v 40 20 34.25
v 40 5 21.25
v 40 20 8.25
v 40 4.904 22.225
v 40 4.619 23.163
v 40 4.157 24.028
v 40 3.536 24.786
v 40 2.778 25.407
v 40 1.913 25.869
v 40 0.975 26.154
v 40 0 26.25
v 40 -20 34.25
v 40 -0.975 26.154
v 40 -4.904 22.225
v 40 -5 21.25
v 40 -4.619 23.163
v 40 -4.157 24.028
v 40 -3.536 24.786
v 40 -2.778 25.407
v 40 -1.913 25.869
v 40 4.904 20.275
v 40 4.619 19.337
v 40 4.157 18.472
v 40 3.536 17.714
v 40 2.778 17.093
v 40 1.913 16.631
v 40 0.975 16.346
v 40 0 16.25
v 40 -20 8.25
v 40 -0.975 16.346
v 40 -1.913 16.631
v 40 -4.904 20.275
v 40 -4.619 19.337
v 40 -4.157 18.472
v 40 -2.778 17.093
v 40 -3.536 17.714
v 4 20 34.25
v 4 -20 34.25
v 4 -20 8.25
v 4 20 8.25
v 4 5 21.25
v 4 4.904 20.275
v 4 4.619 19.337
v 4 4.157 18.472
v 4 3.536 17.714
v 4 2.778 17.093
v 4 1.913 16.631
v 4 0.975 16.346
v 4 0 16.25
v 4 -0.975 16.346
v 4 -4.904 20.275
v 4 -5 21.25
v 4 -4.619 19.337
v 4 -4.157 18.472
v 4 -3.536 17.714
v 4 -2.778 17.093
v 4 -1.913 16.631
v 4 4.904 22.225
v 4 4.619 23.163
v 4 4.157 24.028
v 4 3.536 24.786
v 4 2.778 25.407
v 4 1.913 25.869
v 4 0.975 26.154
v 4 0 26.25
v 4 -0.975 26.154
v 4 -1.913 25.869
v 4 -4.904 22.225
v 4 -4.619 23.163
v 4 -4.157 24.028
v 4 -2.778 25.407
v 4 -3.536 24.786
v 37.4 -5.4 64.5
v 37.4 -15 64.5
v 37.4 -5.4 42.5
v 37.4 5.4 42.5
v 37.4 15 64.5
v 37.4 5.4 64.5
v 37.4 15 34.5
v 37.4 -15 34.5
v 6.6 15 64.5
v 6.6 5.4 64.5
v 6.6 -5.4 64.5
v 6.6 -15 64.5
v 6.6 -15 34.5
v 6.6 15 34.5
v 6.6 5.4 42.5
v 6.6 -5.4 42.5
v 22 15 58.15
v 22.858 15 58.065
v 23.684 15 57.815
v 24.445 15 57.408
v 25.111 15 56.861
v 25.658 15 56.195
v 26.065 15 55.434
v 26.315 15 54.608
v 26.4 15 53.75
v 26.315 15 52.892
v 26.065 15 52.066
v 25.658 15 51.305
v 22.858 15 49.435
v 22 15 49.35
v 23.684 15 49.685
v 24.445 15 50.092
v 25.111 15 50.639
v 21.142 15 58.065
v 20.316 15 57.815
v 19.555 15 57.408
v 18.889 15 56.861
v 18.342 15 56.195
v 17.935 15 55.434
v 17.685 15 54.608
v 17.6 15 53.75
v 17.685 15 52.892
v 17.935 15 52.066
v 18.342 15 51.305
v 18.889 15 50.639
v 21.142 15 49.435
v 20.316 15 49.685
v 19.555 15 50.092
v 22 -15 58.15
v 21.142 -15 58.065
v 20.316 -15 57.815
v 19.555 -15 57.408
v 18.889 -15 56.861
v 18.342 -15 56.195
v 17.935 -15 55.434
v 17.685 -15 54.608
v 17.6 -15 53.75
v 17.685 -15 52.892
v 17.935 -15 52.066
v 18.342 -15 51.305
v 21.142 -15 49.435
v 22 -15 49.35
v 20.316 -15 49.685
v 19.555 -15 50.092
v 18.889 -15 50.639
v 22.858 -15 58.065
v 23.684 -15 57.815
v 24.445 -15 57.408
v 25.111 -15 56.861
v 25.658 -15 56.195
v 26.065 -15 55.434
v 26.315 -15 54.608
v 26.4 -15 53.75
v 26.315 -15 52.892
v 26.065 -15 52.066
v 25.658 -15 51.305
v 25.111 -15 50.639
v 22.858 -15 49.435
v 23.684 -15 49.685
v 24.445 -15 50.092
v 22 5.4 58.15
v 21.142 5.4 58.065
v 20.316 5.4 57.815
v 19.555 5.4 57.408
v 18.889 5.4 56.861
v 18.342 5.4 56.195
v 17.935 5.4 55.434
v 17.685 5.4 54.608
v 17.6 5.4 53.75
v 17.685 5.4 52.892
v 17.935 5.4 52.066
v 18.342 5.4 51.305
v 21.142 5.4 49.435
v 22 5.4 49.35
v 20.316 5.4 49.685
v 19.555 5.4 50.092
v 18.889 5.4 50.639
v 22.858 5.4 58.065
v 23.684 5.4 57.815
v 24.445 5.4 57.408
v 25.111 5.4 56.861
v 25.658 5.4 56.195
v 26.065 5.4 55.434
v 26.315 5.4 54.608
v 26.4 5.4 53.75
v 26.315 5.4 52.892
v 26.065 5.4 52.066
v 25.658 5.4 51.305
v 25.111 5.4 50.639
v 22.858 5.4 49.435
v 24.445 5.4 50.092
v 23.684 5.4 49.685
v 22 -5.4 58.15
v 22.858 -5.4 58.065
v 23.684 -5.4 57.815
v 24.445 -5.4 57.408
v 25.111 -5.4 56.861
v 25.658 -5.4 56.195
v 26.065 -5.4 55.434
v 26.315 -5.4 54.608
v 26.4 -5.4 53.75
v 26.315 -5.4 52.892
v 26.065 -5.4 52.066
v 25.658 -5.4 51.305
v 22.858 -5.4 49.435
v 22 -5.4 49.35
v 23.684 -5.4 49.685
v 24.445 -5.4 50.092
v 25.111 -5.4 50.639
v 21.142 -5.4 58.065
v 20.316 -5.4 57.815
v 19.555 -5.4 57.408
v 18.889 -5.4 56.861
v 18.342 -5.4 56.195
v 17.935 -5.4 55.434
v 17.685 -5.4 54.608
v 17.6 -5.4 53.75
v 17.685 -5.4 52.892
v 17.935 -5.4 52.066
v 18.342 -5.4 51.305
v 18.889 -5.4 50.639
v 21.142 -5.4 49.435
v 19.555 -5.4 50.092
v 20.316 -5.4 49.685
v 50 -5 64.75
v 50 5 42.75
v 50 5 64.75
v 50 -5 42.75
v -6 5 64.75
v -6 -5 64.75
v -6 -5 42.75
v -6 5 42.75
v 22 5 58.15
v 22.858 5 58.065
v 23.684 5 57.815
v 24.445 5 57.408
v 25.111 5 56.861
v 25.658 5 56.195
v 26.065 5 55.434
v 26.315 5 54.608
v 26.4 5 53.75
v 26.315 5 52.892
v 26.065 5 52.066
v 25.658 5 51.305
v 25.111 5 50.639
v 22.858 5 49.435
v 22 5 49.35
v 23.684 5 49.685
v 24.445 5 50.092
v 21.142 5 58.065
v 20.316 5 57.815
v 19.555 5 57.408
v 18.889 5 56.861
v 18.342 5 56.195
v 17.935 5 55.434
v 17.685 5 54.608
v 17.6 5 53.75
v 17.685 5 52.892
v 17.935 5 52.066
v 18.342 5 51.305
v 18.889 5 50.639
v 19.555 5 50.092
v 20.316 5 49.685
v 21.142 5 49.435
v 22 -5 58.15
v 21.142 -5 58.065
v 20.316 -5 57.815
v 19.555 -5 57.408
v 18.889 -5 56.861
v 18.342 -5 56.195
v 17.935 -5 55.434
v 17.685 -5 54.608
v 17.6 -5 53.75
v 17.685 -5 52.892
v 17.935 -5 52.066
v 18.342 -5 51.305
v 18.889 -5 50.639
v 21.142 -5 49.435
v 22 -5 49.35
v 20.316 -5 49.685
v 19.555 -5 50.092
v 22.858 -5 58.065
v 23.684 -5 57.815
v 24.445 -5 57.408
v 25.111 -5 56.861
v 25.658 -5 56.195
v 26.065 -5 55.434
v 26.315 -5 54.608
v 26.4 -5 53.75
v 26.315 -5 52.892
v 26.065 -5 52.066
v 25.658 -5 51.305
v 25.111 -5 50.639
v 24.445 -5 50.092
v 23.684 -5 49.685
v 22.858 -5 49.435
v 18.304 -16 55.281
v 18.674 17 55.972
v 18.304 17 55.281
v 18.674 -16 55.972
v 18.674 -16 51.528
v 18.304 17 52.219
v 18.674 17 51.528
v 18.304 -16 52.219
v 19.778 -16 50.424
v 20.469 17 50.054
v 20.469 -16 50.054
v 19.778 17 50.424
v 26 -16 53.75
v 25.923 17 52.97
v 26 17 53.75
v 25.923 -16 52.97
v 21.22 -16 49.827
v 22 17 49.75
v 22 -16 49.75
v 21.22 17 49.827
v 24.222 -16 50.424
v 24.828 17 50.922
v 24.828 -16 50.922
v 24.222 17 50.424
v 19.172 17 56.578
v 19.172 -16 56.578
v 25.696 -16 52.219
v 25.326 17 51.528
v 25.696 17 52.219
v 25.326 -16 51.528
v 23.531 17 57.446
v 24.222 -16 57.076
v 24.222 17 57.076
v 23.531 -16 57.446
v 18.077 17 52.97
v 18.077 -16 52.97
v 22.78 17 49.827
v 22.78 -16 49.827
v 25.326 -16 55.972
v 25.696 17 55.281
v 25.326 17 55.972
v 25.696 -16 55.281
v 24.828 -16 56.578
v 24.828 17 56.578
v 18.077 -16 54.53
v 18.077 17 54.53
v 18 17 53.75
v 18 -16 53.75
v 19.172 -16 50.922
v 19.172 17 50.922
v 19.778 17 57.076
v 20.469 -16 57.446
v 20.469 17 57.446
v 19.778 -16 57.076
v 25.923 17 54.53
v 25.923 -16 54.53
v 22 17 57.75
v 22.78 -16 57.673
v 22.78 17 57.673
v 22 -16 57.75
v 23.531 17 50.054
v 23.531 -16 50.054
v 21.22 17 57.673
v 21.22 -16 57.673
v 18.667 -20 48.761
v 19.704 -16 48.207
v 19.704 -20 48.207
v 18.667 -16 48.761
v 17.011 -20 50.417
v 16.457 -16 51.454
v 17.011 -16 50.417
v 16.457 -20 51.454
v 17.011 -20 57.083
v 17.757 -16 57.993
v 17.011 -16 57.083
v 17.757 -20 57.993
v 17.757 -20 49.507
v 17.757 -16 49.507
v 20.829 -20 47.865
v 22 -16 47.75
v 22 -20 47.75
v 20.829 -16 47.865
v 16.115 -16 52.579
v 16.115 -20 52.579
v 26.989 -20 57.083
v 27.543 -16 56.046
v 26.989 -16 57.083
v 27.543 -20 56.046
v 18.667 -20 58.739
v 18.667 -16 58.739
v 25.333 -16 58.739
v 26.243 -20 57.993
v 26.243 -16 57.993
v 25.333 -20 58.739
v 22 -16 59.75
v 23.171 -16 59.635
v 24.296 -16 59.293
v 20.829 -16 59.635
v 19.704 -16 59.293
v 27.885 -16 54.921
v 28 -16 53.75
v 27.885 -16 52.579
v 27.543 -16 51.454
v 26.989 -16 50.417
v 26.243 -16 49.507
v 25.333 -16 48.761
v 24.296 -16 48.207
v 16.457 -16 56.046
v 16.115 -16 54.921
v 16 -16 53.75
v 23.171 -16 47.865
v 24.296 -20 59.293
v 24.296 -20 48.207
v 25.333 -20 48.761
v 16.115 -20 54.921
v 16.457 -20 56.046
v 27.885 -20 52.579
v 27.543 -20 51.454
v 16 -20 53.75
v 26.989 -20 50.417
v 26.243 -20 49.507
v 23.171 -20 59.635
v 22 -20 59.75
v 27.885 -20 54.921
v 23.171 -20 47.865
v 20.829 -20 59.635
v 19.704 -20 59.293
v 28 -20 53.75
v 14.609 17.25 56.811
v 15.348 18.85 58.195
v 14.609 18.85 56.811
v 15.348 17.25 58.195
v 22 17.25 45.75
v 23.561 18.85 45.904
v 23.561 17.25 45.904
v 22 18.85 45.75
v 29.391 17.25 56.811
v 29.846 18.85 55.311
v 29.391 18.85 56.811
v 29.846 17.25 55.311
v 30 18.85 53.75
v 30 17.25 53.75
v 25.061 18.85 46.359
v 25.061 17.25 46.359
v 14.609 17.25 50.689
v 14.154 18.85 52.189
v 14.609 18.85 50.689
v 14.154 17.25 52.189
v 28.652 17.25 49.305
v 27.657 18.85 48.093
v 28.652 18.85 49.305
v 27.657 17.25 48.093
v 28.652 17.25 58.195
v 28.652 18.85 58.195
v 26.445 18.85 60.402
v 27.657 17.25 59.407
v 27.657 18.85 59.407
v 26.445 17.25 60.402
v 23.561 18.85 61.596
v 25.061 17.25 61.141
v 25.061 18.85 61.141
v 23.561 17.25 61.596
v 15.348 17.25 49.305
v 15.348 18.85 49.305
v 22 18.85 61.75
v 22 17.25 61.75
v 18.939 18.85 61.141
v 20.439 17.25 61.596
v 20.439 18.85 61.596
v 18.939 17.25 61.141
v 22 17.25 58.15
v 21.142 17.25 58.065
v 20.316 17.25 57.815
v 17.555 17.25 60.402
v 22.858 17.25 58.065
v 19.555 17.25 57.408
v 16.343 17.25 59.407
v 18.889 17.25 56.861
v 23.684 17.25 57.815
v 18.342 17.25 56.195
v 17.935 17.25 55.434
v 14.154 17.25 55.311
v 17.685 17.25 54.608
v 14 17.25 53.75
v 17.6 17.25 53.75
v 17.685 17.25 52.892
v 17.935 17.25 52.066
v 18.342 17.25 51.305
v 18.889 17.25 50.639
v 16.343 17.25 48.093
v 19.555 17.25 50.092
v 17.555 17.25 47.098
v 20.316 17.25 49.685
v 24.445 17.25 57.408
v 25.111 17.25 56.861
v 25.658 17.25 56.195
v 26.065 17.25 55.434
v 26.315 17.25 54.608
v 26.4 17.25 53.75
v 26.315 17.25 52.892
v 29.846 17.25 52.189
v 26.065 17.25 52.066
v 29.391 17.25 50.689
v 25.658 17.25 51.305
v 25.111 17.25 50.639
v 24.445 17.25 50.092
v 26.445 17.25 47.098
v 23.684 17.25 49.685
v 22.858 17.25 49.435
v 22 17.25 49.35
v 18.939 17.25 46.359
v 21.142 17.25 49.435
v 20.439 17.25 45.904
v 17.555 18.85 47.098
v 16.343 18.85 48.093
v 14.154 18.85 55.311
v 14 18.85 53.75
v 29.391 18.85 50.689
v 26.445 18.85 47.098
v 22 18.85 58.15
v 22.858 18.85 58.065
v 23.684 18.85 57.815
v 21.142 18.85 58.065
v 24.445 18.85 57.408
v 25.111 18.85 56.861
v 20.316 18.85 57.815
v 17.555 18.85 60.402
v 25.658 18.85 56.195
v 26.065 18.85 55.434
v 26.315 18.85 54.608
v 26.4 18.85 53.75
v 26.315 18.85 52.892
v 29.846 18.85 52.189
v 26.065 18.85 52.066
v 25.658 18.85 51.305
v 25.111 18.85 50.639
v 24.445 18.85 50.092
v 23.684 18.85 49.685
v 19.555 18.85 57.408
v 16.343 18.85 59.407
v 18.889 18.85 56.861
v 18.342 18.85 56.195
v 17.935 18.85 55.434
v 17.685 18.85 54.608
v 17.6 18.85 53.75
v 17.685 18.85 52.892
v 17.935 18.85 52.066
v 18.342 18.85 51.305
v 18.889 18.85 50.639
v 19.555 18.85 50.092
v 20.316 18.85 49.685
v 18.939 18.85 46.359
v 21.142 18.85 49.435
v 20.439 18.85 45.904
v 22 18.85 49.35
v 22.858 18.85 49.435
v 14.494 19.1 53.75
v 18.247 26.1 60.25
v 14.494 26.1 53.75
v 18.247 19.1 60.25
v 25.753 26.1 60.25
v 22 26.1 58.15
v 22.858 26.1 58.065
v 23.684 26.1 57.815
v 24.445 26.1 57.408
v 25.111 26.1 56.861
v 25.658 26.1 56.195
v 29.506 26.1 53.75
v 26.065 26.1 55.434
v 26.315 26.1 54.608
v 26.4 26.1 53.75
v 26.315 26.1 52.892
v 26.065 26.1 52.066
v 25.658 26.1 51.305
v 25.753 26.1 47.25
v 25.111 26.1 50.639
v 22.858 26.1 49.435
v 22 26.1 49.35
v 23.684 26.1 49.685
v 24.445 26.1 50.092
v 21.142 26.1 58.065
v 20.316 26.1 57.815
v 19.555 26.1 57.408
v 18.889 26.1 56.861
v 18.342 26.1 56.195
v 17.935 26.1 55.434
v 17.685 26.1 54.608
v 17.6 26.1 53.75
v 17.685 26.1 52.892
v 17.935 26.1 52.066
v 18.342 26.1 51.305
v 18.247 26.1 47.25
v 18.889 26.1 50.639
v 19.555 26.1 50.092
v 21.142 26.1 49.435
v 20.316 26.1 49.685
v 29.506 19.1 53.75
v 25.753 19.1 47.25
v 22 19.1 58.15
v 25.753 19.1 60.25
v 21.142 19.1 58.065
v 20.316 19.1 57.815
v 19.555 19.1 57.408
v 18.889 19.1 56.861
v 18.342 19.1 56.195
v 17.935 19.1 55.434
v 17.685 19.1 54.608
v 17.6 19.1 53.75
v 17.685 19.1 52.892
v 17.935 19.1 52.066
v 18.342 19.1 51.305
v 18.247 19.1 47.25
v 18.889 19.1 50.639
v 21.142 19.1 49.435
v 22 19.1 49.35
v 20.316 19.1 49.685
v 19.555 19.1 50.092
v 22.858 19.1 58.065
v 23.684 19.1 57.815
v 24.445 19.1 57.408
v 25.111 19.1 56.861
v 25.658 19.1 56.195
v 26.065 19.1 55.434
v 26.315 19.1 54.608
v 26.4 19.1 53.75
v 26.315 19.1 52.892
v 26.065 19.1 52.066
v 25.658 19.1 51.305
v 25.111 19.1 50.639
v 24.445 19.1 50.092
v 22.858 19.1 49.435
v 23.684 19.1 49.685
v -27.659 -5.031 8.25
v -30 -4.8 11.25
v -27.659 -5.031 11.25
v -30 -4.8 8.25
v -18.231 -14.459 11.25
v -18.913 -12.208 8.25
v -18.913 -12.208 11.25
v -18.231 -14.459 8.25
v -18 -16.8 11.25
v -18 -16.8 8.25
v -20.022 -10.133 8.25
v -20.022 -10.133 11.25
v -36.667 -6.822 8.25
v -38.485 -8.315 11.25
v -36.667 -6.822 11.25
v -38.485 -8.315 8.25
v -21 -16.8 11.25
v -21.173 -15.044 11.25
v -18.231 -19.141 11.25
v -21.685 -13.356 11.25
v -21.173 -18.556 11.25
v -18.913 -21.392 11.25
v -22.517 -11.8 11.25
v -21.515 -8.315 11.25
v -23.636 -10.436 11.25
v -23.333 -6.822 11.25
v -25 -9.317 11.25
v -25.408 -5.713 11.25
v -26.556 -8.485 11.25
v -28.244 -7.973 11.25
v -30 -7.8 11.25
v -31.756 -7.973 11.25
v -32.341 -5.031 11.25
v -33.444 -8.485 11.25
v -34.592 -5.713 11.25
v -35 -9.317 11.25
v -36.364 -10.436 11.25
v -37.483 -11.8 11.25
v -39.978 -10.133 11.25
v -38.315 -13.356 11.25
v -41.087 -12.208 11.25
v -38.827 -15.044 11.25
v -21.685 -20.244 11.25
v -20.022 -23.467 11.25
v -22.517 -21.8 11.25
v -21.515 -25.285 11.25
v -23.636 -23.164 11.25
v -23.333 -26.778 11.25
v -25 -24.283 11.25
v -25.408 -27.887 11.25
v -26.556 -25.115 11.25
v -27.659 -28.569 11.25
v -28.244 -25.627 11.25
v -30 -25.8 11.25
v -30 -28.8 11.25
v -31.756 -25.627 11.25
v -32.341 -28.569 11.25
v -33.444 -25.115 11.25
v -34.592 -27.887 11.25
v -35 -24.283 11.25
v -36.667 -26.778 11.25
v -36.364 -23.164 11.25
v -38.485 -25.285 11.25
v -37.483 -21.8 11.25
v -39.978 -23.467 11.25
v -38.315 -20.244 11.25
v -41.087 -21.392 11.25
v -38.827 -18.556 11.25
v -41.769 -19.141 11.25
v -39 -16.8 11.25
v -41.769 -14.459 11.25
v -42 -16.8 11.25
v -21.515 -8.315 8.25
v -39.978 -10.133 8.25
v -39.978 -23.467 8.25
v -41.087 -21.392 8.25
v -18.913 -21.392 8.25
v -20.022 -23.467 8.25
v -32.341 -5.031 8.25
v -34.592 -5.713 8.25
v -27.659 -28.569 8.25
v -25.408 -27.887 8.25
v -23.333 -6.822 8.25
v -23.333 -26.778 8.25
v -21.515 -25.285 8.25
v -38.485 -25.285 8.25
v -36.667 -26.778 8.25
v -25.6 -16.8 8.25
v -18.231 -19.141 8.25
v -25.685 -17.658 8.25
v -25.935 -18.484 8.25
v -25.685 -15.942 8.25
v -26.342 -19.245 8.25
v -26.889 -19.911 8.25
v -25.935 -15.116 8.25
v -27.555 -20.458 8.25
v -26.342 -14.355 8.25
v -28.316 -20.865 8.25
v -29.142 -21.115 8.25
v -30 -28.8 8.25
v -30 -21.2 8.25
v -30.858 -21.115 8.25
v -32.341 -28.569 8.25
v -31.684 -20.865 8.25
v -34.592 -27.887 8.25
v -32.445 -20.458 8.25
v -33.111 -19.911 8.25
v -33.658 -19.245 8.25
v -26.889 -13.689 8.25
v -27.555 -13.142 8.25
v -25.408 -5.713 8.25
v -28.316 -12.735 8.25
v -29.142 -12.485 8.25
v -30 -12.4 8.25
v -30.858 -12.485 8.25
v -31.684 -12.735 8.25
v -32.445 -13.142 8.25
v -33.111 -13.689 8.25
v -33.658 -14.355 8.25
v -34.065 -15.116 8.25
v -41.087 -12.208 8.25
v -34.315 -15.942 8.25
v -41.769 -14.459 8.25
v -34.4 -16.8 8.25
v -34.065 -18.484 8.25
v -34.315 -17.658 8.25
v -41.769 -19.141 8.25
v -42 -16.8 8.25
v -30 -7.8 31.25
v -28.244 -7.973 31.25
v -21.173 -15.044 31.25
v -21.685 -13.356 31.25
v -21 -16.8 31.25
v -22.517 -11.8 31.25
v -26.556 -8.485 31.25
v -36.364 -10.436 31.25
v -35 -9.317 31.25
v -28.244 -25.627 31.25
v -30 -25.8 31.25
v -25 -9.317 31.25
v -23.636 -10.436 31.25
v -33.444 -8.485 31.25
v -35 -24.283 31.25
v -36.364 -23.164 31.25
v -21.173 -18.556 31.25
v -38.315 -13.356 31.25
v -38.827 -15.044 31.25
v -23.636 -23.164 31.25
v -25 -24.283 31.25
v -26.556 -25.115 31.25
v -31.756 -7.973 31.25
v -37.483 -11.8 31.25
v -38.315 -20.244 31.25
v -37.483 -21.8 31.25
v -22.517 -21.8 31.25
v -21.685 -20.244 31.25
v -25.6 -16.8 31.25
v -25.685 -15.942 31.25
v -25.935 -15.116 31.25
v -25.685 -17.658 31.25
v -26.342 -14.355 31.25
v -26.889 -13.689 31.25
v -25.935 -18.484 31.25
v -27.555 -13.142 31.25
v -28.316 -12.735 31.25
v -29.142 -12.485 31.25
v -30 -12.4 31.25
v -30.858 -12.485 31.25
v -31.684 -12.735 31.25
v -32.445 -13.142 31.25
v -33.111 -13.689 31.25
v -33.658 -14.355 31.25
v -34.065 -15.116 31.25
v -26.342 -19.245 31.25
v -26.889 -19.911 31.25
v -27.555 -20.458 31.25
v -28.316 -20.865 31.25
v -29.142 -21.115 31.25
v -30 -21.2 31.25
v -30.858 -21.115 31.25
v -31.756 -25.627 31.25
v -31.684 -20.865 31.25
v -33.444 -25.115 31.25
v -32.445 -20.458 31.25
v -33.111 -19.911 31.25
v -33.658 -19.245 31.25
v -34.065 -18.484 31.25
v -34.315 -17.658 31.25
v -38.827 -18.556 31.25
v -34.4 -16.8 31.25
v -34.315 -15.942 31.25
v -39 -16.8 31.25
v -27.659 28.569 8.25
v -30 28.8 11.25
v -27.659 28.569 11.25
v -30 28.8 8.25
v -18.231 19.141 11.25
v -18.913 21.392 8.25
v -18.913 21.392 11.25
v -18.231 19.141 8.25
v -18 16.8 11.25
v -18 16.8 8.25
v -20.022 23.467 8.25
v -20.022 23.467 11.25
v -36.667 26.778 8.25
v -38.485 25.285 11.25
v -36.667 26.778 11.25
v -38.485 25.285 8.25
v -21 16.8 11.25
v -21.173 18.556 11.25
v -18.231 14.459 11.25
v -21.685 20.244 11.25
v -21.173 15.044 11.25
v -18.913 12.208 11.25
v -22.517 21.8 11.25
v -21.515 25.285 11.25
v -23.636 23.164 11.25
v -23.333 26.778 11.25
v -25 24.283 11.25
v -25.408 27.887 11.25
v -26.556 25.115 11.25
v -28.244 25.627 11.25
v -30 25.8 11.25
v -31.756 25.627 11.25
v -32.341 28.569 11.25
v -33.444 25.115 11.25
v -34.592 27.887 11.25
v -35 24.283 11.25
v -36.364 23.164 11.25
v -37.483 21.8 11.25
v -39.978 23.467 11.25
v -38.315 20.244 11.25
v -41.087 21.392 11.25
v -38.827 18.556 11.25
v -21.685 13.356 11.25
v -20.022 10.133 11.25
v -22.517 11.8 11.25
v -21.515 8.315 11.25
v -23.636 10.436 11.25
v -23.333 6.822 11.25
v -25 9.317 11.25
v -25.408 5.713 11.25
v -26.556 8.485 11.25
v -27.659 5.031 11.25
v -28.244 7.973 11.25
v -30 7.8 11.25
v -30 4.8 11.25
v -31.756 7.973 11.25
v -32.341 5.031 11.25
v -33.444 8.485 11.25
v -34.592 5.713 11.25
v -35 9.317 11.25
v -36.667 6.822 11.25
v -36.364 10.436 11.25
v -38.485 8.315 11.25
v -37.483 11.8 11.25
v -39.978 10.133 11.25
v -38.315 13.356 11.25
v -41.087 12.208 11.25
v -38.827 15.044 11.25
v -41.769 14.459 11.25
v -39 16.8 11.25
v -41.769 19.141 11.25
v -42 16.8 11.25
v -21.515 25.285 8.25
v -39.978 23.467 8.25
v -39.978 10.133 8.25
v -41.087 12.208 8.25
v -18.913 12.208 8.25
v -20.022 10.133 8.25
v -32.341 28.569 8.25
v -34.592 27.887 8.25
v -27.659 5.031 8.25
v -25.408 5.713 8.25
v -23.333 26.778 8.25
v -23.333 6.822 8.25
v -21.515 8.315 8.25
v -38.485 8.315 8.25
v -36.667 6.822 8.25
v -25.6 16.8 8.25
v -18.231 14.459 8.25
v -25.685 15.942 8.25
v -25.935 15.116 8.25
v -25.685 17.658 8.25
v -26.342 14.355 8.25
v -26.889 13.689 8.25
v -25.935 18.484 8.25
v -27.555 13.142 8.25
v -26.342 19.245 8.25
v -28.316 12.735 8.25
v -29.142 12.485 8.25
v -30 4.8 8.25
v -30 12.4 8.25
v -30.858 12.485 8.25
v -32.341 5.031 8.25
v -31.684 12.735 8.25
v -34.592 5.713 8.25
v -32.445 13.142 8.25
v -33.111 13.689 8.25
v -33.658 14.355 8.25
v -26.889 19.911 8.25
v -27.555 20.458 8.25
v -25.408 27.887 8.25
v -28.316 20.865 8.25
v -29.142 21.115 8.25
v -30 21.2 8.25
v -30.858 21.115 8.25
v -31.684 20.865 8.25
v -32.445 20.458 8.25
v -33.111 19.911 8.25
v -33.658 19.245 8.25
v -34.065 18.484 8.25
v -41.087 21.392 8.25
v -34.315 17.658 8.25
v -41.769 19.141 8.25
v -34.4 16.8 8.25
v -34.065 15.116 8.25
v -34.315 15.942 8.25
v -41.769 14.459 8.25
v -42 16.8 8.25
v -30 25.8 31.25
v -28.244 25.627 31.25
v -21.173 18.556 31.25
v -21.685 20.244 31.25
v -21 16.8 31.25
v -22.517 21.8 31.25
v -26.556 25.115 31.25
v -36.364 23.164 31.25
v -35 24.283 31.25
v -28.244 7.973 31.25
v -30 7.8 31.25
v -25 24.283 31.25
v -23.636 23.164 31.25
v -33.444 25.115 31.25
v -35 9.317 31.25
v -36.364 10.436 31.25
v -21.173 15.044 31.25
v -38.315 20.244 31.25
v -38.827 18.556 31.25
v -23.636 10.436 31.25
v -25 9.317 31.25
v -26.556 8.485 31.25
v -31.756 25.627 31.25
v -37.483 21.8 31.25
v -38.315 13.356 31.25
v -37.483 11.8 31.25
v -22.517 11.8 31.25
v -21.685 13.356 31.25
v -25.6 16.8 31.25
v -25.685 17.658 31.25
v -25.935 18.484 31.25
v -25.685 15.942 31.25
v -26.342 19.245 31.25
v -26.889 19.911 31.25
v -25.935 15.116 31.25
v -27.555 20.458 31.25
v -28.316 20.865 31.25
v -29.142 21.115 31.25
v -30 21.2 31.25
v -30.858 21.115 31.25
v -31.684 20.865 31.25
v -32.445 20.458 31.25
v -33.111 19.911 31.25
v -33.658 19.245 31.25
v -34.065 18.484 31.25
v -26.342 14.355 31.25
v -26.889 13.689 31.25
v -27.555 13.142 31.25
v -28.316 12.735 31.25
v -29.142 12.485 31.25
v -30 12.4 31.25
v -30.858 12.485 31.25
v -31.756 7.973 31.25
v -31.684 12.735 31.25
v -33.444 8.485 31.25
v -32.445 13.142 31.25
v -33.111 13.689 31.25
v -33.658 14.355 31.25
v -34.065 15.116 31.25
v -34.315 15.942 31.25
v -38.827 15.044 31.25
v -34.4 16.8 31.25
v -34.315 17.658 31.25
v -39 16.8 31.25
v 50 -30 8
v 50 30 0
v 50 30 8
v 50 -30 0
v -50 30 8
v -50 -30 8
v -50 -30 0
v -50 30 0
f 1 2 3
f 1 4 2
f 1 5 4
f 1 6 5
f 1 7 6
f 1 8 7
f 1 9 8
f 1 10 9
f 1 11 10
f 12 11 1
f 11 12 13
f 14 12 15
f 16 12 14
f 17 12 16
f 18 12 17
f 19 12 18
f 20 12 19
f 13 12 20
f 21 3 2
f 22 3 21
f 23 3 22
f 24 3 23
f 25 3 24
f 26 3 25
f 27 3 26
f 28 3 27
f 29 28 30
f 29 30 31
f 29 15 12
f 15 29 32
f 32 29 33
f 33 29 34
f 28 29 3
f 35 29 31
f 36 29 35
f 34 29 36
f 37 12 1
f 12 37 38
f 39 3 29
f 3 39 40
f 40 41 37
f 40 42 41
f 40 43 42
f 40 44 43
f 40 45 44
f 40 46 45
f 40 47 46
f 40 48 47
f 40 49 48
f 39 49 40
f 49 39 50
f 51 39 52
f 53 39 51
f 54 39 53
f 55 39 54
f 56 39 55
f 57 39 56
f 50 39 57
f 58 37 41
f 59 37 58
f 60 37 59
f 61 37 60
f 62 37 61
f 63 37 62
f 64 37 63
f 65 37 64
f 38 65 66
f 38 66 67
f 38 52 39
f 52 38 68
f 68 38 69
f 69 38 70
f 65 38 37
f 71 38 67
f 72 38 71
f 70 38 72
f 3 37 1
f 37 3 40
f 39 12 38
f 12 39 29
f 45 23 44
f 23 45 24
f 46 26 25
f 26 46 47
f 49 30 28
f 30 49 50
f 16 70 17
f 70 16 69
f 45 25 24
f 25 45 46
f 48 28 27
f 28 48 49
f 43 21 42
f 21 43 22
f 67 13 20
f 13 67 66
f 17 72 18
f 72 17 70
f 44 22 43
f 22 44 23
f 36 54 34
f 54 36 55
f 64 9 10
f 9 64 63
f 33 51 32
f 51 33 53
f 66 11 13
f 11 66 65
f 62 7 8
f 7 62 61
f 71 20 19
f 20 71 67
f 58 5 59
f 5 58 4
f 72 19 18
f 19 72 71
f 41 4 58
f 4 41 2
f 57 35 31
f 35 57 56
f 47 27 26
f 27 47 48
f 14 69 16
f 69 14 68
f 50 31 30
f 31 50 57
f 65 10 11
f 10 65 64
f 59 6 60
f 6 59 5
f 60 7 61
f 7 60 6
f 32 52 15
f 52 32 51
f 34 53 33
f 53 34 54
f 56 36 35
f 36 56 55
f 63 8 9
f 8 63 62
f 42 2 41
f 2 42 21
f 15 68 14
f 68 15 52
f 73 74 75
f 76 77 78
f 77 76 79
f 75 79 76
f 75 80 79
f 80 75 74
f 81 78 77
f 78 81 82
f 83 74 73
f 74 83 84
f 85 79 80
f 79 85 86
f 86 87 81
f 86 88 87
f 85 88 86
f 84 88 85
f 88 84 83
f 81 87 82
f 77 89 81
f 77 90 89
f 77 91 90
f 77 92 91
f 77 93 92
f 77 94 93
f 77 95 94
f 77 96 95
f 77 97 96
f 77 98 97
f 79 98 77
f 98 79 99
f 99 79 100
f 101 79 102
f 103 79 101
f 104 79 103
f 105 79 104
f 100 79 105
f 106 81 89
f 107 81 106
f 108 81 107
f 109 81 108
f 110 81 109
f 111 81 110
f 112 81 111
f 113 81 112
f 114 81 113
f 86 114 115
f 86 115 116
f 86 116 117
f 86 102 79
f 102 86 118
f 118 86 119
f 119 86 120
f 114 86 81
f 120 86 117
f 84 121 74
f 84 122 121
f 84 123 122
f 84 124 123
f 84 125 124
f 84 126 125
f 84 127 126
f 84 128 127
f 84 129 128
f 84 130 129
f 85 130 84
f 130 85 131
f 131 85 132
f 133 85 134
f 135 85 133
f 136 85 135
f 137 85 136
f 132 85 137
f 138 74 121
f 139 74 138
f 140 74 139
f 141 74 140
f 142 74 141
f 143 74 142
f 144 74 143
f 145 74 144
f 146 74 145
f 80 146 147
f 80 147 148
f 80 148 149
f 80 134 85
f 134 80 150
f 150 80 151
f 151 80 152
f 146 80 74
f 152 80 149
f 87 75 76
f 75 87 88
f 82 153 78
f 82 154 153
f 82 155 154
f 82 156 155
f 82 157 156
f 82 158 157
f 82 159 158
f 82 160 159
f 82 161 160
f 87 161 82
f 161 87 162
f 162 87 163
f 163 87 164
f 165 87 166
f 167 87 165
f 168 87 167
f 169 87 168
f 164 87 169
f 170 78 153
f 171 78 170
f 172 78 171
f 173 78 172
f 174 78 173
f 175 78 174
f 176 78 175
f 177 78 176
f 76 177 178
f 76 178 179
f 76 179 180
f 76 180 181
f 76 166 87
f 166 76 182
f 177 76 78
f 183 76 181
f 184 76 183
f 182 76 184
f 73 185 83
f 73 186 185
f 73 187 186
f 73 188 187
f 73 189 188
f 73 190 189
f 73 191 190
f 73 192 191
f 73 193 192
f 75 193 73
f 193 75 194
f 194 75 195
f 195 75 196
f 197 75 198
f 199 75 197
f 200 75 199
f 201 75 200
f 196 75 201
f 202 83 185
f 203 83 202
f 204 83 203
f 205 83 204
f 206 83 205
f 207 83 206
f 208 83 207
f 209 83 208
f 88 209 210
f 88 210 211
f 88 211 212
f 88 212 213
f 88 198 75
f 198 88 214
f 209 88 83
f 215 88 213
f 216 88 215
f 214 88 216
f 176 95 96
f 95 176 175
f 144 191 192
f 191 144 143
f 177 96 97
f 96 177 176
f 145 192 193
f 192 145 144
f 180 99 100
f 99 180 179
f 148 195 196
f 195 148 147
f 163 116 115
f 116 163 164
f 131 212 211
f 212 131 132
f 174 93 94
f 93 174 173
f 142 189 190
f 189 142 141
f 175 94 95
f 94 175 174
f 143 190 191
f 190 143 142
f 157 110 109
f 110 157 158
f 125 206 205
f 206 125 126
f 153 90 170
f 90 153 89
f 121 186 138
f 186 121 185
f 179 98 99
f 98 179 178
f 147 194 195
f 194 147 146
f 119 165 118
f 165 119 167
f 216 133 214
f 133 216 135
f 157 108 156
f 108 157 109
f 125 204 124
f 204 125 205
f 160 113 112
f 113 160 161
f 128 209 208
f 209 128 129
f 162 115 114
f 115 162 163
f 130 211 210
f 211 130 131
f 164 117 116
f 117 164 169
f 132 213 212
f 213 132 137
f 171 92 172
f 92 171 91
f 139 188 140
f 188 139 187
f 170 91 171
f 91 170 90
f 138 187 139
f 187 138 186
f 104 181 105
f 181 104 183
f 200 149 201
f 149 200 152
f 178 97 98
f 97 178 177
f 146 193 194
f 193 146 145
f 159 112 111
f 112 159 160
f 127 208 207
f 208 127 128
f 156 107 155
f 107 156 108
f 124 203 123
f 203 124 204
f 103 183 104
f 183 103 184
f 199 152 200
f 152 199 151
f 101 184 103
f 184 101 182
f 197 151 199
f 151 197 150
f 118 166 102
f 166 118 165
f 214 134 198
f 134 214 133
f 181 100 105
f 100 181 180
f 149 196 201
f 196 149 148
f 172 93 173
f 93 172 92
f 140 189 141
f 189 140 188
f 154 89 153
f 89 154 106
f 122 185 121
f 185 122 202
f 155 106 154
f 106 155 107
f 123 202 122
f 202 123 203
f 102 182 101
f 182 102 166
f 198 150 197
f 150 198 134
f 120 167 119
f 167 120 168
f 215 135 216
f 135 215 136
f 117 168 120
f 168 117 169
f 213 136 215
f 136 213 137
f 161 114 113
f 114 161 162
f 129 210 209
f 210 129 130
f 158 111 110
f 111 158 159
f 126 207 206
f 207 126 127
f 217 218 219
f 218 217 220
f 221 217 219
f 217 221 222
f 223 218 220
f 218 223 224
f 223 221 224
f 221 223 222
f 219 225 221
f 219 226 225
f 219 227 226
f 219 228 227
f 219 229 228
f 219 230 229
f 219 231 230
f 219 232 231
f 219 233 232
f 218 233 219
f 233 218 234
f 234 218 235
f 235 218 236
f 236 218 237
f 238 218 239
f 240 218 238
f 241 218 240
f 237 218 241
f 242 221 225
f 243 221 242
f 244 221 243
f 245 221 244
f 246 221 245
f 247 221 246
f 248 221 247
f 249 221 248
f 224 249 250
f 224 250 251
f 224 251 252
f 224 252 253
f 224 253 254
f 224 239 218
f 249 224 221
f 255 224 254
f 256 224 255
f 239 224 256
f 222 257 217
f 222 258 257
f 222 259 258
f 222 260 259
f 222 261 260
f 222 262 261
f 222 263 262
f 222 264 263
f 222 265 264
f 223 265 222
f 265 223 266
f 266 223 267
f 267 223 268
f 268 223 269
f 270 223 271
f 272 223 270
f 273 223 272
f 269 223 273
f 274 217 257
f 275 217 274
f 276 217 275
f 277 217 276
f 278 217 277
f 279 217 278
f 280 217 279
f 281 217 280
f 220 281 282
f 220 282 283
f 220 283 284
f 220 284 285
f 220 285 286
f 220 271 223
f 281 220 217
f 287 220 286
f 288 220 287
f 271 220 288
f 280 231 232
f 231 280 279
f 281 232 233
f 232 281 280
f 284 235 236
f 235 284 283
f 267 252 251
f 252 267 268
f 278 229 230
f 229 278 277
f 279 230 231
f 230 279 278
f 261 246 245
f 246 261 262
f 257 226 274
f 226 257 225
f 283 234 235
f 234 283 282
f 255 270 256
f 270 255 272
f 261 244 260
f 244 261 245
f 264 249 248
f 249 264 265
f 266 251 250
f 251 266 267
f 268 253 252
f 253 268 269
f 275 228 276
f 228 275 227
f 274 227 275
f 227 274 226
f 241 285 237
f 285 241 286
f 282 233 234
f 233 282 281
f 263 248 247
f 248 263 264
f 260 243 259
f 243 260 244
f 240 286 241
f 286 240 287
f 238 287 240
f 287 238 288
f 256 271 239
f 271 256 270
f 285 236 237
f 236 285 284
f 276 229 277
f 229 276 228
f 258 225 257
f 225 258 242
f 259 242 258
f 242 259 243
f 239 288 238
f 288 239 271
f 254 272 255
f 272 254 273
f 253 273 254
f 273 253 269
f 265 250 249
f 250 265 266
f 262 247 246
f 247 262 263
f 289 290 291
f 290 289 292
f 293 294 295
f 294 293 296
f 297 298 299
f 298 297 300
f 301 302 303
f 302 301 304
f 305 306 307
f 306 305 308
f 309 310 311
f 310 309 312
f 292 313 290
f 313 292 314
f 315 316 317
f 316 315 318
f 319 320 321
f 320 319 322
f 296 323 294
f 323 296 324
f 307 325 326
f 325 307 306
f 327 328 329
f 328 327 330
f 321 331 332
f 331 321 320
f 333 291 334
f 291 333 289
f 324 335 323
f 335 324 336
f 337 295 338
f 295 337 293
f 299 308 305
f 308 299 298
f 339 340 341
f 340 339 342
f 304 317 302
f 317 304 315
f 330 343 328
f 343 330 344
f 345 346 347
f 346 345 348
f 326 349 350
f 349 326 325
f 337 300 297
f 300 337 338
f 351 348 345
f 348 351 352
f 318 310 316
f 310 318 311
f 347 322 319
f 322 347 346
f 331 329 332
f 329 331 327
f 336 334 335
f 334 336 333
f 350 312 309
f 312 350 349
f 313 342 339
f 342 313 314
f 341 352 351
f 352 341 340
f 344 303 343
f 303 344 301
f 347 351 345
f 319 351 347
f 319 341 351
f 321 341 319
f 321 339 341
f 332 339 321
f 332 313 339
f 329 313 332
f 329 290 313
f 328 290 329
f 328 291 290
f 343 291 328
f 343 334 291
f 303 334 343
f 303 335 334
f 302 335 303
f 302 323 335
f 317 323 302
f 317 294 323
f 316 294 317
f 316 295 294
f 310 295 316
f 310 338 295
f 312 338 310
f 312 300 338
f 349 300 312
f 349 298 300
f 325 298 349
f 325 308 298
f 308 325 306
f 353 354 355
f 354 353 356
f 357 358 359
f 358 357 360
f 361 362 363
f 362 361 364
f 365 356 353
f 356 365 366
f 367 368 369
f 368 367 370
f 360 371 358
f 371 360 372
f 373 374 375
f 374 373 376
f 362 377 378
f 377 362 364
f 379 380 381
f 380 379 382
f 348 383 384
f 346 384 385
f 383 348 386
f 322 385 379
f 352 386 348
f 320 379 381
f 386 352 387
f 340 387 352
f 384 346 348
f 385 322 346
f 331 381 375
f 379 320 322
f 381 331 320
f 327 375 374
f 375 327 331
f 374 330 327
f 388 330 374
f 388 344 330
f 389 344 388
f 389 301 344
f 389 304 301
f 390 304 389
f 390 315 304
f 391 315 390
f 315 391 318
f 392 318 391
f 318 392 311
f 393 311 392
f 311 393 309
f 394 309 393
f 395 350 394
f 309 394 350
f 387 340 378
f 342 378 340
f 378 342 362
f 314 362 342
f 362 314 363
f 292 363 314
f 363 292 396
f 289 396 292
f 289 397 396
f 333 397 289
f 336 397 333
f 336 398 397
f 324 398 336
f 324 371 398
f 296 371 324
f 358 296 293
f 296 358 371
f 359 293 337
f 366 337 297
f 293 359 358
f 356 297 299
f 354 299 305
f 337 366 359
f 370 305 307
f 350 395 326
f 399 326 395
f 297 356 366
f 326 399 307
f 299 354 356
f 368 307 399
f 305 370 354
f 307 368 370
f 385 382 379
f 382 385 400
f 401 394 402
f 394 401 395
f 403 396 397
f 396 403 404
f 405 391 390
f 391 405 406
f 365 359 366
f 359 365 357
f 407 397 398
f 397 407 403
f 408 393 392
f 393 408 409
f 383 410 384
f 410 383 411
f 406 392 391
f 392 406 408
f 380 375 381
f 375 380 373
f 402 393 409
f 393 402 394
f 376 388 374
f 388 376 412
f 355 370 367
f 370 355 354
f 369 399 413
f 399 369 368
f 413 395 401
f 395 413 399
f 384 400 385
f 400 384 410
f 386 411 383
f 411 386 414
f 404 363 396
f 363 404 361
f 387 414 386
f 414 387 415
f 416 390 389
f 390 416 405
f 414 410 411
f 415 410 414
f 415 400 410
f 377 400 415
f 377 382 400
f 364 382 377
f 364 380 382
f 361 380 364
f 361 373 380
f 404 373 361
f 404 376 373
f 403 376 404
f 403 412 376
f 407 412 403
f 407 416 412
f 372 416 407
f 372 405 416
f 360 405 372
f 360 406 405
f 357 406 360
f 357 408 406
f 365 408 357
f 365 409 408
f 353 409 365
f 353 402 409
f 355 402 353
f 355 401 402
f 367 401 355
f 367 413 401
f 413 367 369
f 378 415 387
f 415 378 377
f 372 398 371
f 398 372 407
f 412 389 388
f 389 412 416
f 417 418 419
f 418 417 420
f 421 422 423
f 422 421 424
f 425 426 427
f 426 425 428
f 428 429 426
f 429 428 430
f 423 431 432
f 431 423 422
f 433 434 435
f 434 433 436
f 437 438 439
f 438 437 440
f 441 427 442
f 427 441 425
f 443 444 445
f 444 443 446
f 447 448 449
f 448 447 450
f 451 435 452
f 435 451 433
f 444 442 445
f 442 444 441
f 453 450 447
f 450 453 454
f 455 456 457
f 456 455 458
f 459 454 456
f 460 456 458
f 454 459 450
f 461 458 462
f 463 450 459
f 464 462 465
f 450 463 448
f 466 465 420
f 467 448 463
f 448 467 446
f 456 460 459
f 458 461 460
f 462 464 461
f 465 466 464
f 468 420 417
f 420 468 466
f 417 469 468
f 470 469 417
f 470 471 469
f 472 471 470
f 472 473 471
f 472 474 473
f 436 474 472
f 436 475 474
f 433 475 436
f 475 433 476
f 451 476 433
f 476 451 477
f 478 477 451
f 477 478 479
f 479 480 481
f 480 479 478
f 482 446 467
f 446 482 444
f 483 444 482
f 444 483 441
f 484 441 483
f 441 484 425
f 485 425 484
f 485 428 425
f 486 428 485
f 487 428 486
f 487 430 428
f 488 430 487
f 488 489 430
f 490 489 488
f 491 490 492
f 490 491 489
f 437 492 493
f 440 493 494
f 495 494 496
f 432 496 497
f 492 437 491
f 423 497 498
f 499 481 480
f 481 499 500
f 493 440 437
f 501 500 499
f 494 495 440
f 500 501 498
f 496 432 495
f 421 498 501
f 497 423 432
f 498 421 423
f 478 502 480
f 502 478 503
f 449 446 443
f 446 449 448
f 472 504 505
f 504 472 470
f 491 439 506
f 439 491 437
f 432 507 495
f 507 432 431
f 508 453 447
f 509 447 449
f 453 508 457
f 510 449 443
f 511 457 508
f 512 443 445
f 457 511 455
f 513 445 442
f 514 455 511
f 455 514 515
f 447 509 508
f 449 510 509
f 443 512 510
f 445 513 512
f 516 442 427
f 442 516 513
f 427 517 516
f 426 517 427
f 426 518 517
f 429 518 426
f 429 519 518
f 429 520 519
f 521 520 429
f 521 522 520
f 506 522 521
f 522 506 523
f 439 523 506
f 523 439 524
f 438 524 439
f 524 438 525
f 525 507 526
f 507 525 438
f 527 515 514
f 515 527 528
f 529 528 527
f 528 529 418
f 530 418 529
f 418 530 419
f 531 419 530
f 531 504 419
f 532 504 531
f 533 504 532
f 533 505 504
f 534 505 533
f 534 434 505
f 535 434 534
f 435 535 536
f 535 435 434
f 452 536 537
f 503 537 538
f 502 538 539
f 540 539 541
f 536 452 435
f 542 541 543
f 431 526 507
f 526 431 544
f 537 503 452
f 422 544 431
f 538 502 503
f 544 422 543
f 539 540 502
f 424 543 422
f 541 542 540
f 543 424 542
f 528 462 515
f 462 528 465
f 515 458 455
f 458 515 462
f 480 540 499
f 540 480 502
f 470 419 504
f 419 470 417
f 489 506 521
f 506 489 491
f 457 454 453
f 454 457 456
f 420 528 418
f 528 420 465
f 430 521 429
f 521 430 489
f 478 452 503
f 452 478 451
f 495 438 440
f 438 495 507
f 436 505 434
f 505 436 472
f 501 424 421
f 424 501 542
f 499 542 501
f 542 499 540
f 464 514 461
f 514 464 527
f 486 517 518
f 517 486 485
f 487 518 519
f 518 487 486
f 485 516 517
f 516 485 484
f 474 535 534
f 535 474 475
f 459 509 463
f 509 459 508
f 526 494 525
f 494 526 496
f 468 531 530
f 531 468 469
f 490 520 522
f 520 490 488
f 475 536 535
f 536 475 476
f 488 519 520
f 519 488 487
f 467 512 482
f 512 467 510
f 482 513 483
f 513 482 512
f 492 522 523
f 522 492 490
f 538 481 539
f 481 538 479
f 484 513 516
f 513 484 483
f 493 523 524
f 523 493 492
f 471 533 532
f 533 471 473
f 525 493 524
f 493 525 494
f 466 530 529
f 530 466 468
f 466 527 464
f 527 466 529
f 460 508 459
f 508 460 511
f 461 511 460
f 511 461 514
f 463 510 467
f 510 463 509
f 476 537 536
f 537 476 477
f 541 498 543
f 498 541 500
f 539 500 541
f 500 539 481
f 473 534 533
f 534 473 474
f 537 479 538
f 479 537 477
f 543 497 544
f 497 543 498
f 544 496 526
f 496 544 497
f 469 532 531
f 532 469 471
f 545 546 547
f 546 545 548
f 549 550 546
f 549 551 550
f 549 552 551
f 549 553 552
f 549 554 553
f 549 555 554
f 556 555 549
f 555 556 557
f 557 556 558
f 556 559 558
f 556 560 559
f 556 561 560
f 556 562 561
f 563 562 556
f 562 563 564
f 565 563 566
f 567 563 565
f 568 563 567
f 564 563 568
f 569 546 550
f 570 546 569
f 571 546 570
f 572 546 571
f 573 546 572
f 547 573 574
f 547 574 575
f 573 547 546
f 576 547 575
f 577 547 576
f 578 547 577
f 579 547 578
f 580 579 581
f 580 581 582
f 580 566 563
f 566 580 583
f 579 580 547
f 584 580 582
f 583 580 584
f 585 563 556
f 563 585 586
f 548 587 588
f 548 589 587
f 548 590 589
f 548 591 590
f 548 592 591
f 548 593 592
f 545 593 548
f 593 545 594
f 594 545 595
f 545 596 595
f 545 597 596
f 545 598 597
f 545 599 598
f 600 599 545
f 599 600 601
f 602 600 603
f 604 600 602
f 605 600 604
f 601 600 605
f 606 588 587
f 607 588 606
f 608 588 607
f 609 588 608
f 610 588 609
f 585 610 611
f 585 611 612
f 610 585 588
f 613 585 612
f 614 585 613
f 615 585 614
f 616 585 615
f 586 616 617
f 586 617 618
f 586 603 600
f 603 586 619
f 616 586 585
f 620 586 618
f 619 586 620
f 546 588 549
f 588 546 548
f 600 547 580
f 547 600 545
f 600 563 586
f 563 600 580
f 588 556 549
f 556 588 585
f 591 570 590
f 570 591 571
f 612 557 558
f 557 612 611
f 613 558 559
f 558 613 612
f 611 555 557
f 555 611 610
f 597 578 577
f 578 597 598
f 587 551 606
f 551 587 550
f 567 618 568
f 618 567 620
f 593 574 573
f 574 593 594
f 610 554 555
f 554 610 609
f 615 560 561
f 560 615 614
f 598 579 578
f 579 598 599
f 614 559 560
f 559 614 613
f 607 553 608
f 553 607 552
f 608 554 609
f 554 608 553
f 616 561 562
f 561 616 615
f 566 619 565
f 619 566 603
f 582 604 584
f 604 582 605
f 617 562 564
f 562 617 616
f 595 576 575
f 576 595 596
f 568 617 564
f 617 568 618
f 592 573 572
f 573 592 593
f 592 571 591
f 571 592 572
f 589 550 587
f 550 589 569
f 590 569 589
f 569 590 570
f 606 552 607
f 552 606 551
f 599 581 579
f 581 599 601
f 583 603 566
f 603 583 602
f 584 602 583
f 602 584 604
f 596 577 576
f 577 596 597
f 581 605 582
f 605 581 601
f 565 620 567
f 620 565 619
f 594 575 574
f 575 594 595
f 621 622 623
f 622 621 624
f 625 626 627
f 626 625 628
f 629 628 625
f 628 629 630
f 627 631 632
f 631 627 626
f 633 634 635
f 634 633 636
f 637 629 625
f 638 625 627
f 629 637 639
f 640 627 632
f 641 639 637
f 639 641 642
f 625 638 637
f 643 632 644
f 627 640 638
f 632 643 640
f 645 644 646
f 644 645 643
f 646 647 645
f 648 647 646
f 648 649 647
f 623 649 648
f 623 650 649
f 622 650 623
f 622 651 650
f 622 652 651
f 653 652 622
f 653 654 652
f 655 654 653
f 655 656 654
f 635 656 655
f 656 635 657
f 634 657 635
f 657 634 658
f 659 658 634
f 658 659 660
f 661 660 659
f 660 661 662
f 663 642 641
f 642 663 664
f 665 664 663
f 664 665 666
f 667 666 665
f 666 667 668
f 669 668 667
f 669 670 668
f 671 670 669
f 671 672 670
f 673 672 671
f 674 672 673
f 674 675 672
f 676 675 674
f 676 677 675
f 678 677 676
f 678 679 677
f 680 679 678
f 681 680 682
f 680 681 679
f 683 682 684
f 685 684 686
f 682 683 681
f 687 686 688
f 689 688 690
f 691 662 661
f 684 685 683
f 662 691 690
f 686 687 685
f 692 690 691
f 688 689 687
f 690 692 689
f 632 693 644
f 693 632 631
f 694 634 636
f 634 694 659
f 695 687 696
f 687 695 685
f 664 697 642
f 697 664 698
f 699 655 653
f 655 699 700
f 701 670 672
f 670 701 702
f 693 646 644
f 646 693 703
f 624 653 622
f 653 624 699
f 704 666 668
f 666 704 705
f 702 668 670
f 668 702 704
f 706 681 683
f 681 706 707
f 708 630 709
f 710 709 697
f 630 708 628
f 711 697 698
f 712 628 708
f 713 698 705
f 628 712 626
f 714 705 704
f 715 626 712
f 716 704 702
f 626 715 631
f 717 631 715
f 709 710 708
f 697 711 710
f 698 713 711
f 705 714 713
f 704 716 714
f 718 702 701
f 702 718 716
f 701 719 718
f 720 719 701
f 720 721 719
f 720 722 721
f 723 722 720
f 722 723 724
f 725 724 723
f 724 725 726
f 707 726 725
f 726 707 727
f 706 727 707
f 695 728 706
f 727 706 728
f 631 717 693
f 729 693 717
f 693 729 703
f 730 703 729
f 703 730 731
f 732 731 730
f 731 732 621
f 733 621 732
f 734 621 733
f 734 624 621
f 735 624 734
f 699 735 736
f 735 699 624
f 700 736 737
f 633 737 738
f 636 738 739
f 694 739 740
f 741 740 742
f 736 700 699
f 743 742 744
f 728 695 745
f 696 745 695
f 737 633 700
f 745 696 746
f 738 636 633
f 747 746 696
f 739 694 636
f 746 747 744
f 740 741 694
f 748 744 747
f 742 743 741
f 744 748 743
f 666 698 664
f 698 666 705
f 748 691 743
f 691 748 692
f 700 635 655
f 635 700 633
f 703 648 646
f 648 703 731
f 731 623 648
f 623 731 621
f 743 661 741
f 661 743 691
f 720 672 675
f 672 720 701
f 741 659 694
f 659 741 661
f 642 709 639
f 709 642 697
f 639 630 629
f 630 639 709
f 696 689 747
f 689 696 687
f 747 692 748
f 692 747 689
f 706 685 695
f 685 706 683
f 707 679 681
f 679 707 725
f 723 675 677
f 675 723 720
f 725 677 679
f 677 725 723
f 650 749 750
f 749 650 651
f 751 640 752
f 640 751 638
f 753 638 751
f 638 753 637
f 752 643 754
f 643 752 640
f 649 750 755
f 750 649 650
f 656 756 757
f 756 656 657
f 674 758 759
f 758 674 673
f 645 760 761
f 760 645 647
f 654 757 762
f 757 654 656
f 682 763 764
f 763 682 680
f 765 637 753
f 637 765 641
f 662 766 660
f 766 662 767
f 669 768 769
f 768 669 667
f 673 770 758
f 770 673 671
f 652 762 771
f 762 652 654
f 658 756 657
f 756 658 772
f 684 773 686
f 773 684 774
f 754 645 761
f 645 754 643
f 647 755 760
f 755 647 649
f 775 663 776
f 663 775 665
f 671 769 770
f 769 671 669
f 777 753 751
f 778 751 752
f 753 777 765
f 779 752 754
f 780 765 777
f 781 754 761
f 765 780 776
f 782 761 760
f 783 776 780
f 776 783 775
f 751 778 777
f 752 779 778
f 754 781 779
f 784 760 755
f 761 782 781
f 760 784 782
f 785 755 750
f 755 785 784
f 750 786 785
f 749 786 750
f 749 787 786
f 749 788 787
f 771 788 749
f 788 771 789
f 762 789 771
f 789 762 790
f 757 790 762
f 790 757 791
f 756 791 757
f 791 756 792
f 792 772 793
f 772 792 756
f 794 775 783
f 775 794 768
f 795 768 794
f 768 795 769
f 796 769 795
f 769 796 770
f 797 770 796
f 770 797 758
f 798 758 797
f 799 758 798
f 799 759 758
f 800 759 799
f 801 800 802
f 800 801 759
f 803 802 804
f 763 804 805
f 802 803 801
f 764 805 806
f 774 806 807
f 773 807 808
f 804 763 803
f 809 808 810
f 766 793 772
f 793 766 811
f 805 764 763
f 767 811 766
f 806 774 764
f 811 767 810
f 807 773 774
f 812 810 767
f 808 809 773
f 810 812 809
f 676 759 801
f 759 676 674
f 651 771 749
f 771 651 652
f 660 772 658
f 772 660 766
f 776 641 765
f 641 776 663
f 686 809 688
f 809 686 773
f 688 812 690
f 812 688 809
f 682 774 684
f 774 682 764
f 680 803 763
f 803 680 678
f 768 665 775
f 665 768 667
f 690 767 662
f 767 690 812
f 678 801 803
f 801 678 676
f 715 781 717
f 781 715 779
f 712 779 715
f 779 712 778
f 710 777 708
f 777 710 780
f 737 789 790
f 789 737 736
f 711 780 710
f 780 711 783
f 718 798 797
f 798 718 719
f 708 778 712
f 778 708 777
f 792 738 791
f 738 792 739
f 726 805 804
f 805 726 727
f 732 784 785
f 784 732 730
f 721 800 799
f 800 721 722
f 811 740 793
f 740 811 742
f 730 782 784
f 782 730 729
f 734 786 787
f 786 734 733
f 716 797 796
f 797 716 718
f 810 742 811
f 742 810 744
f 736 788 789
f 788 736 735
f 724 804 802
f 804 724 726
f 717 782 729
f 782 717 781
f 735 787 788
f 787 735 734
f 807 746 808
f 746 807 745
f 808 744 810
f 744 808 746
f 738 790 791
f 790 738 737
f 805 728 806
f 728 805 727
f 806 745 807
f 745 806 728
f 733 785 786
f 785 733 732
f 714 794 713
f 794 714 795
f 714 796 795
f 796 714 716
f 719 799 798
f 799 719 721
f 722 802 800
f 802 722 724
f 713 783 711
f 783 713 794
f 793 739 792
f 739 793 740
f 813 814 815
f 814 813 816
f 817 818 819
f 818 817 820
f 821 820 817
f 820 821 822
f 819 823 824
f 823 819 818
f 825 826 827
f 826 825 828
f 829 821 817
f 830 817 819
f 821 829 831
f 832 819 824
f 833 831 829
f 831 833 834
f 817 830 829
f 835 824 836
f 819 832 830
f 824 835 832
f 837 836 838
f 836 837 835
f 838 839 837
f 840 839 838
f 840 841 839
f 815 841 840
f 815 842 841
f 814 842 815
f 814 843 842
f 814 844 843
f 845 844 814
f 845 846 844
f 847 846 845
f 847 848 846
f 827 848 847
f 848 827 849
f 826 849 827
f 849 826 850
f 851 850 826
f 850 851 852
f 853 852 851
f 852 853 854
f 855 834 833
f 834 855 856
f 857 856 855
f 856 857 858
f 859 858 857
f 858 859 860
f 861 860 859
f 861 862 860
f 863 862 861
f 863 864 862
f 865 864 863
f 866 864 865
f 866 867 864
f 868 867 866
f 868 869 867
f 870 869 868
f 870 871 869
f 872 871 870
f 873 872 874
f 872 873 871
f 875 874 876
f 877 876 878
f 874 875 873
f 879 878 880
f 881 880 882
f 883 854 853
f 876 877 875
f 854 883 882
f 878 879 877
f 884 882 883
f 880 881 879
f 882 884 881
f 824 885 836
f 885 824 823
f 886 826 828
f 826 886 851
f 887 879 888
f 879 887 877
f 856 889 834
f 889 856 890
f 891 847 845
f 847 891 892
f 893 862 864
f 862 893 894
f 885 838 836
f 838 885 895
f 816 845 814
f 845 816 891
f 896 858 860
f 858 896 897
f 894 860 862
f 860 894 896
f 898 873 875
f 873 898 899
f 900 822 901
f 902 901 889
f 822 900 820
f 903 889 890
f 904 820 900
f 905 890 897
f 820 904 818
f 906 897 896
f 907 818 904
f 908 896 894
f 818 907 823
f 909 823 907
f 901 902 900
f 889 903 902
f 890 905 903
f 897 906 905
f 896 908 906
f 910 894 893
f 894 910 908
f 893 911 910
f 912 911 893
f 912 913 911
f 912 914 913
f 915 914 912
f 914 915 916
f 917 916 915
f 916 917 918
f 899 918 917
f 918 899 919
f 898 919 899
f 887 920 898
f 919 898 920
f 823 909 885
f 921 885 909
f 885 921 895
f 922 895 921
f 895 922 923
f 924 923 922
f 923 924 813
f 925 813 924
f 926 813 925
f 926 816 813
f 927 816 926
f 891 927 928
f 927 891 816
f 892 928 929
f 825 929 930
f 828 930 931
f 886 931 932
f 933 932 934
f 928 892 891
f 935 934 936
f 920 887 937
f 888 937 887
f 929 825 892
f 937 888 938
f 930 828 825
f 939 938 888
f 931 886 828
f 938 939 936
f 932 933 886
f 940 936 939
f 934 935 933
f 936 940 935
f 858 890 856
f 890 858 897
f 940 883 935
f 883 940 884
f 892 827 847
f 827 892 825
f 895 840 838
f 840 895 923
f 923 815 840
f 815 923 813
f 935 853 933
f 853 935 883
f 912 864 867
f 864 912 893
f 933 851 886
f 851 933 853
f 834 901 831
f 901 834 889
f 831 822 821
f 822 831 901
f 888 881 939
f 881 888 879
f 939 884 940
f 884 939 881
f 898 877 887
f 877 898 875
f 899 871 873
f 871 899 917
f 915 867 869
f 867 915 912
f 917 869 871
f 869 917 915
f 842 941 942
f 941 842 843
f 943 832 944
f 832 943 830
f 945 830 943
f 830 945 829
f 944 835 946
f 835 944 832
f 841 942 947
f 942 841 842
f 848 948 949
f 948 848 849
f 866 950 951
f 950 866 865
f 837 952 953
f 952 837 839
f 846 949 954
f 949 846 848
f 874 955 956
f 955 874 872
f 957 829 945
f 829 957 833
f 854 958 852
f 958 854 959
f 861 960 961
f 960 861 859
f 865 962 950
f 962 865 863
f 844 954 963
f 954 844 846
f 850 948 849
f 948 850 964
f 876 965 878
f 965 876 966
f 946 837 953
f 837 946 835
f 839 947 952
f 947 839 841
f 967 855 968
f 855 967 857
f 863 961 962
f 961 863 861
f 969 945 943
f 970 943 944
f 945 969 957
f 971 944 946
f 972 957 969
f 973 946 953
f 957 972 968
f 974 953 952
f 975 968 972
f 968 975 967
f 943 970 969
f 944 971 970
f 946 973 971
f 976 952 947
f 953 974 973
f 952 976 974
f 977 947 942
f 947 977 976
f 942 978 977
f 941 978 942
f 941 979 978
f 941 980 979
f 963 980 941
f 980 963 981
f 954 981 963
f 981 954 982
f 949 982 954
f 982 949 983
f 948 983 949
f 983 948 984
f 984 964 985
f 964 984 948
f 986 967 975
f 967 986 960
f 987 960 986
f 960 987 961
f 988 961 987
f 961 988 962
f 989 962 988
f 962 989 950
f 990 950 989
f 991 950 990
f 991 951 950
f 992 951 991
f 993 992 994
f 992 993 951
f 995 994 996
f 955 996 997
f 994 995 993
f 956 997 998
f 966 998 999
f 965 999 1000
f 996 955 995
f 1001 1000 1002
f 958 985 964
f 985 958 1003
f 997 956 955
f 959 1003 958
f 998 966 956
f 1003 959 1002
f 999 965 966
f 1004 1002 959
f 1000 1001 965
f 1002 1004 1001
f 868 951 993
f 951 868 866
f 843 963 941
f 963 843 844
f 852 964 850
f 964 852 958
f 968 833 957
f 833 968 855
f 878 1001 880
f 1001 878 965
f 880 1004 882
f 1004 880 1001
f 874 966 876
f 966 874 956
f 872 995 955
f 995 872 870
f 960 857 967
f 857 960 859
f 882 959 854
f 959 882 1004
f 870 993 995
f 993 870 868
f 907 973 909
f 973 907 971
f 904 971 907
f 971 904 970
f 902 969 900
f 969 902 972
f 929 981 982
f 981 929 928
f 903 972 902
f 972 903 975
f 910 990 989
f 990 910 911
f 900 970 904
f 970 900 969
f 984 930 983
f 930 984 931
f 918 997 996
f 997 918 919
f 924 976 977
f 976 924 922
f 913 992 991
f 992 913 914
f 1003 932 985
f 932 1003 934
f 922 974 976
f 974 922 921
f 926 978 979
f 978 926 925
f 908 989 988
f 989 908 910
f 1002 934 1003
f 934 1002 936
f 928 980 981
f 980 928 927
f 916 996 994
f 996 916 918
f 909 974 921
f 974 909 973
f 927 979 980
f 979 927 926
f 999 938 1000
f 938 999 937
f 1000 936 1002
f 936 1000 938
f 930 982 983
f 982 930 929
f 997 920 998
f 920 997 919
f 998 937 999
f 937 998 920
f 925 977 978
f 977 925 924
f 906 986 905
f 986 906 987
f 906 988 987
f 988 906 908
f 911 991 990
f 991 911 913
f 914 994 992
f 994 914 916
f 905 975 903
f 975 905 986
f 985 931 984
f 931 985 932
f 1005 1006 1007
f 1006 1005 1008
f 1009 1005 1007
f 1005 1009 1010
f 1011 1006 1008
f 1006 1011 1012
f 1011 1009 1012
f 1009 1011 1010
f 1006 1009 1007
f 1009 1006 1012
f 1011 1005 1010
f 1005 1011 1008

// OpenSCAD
$fn = 32;

// ------------------------------------------------------------------------
// Indexing jig: plate 100 x 60 mm, pin d8
// Every part is its own module, assembly() places every instance.
// ------------------------------------------------------------------------

// --- part 1 ---
module jig_plate() {
  difference() {
    translate([-50, -30, 0]) cube([100, 60, 8]);
  }
}

// --- part 2 ---
module locator_block() {
  difference() {
    translate([-18, -20, 0]) cube([36, 40, 26]);
    translate([0, 0, 13]) rotate([0, 90, 0]) cylinder(h = 38, d = 10, center = true);
  }
}

// --- part 3 ---
module index_fork() {
  difference() {
    translate([-15.4, -15, 0]) cube([30.8, 30, 30]);
    translate([-16.4, -5.4, 8]) cube([32.8, 10.8, 23]);
    translate([0, 0, 19.25]) rotate([90, 0, 0]) cylinder(h = 32, d = 8.8, center = true);
  }
}

// --- part 4 ---
module index_arm() {
  difference() {
    translate([-28, -5, 0]) cube([56, 10, 22]);
    translate([0, 0, 11]) rotate([90, 0, 0]) cylinder(h = 12, d = 8.8, center = true);
  }
}

// --- part 5 ---
module index_pin() {
  rotate([0, 90, 0]) cylinder(h = 34, d = 8, center = true);
  translate([-20, 0, 0]) rotate([0, 90, 0]) cylinder(h = 4, d = 12);
}

// --- part 6 ---
module pin_washer() {
  difference() {
      translate([0, 0, 0]) cylinder(h = 1.6, d = 16);
      translate([0, 0, -1]) cylinder(h = 3.6, d = 8.8);
    }
}

// --- part 7 ---
module lock_nut() {
  difference() {
    linear_extrude(height = 7) polygon(points = [[7.506, 0], [3.753, 6.5], [-3.753, 6.5], [-7.506, 0], [-3.753, -6.5], [3.753, -6.5]]);
    translate([0, 0, -1]) cylinder(h = 9, d = 8.8);
  }
}

// --- part 8 ---
module guide_bush_a() {
  difference() {
    union() {
      cylinder(h = 3, d = 24);
      translate([0, 0, 3]) cylinder(h = 20, d = 18);
    }
    translate([0, 0, -1]) cylinder(h = 25, d = 8.8);
  }
}

// --- part 9 ---
module guide_bush_b() {
  difference() {
    union() {
      cylinder(h = 3, d = 24);
      translate([0, 0, 3]) cylinder(h = 20, d = 18);
    }
    translate([0, 0, -1]) cylinder(h = 25, d = 8.8);
  }
}

// --- assembly ---
module assembly() {
  color([0.80, 0.24, 0.20]) translate([0, 0, 0]) rotate([0, 0, 0]) jig_plate();
  color([0.20, 0.45, 0.75]) translate([22, 0, 8.25]) rotate([0, 0, 0]) locator_block();
  color([0.25, 0.62, 0.32]) translate([22, 0, 34.5]) rotate([0, 0, 0]) index_fork();
  color([0.92, 0.70, 0.18]) translate([22, 0, 42.75]) rotate([0, 0, 0]) index_arm();
  color([0.58, 0.35, 0.70]) translate([22, 0, 53.75]) rotate([0, 0, 90]) index_pin();
  color([0.16, 0.66, 0.66]) translate([22, 18.85, 53.75]) rotate([90, 0, 0]) pin_washer();
  color([0.85, 0.48, 0.18]) translate([22, 26.1, 53.75]) rotate([90, 0, 0]) lock_nut();
  color([0.55, 0.60, 0.65]) translate([-30, -16.8, 8.25]) rotate([0, 0, 0]) guide_bush_a();
  color([0.75, 0.30, 0.55]) translate([-30, 16.8, 8.25]) rotate([0, 0, 0]) guide_bush_b();
}

assembly();
